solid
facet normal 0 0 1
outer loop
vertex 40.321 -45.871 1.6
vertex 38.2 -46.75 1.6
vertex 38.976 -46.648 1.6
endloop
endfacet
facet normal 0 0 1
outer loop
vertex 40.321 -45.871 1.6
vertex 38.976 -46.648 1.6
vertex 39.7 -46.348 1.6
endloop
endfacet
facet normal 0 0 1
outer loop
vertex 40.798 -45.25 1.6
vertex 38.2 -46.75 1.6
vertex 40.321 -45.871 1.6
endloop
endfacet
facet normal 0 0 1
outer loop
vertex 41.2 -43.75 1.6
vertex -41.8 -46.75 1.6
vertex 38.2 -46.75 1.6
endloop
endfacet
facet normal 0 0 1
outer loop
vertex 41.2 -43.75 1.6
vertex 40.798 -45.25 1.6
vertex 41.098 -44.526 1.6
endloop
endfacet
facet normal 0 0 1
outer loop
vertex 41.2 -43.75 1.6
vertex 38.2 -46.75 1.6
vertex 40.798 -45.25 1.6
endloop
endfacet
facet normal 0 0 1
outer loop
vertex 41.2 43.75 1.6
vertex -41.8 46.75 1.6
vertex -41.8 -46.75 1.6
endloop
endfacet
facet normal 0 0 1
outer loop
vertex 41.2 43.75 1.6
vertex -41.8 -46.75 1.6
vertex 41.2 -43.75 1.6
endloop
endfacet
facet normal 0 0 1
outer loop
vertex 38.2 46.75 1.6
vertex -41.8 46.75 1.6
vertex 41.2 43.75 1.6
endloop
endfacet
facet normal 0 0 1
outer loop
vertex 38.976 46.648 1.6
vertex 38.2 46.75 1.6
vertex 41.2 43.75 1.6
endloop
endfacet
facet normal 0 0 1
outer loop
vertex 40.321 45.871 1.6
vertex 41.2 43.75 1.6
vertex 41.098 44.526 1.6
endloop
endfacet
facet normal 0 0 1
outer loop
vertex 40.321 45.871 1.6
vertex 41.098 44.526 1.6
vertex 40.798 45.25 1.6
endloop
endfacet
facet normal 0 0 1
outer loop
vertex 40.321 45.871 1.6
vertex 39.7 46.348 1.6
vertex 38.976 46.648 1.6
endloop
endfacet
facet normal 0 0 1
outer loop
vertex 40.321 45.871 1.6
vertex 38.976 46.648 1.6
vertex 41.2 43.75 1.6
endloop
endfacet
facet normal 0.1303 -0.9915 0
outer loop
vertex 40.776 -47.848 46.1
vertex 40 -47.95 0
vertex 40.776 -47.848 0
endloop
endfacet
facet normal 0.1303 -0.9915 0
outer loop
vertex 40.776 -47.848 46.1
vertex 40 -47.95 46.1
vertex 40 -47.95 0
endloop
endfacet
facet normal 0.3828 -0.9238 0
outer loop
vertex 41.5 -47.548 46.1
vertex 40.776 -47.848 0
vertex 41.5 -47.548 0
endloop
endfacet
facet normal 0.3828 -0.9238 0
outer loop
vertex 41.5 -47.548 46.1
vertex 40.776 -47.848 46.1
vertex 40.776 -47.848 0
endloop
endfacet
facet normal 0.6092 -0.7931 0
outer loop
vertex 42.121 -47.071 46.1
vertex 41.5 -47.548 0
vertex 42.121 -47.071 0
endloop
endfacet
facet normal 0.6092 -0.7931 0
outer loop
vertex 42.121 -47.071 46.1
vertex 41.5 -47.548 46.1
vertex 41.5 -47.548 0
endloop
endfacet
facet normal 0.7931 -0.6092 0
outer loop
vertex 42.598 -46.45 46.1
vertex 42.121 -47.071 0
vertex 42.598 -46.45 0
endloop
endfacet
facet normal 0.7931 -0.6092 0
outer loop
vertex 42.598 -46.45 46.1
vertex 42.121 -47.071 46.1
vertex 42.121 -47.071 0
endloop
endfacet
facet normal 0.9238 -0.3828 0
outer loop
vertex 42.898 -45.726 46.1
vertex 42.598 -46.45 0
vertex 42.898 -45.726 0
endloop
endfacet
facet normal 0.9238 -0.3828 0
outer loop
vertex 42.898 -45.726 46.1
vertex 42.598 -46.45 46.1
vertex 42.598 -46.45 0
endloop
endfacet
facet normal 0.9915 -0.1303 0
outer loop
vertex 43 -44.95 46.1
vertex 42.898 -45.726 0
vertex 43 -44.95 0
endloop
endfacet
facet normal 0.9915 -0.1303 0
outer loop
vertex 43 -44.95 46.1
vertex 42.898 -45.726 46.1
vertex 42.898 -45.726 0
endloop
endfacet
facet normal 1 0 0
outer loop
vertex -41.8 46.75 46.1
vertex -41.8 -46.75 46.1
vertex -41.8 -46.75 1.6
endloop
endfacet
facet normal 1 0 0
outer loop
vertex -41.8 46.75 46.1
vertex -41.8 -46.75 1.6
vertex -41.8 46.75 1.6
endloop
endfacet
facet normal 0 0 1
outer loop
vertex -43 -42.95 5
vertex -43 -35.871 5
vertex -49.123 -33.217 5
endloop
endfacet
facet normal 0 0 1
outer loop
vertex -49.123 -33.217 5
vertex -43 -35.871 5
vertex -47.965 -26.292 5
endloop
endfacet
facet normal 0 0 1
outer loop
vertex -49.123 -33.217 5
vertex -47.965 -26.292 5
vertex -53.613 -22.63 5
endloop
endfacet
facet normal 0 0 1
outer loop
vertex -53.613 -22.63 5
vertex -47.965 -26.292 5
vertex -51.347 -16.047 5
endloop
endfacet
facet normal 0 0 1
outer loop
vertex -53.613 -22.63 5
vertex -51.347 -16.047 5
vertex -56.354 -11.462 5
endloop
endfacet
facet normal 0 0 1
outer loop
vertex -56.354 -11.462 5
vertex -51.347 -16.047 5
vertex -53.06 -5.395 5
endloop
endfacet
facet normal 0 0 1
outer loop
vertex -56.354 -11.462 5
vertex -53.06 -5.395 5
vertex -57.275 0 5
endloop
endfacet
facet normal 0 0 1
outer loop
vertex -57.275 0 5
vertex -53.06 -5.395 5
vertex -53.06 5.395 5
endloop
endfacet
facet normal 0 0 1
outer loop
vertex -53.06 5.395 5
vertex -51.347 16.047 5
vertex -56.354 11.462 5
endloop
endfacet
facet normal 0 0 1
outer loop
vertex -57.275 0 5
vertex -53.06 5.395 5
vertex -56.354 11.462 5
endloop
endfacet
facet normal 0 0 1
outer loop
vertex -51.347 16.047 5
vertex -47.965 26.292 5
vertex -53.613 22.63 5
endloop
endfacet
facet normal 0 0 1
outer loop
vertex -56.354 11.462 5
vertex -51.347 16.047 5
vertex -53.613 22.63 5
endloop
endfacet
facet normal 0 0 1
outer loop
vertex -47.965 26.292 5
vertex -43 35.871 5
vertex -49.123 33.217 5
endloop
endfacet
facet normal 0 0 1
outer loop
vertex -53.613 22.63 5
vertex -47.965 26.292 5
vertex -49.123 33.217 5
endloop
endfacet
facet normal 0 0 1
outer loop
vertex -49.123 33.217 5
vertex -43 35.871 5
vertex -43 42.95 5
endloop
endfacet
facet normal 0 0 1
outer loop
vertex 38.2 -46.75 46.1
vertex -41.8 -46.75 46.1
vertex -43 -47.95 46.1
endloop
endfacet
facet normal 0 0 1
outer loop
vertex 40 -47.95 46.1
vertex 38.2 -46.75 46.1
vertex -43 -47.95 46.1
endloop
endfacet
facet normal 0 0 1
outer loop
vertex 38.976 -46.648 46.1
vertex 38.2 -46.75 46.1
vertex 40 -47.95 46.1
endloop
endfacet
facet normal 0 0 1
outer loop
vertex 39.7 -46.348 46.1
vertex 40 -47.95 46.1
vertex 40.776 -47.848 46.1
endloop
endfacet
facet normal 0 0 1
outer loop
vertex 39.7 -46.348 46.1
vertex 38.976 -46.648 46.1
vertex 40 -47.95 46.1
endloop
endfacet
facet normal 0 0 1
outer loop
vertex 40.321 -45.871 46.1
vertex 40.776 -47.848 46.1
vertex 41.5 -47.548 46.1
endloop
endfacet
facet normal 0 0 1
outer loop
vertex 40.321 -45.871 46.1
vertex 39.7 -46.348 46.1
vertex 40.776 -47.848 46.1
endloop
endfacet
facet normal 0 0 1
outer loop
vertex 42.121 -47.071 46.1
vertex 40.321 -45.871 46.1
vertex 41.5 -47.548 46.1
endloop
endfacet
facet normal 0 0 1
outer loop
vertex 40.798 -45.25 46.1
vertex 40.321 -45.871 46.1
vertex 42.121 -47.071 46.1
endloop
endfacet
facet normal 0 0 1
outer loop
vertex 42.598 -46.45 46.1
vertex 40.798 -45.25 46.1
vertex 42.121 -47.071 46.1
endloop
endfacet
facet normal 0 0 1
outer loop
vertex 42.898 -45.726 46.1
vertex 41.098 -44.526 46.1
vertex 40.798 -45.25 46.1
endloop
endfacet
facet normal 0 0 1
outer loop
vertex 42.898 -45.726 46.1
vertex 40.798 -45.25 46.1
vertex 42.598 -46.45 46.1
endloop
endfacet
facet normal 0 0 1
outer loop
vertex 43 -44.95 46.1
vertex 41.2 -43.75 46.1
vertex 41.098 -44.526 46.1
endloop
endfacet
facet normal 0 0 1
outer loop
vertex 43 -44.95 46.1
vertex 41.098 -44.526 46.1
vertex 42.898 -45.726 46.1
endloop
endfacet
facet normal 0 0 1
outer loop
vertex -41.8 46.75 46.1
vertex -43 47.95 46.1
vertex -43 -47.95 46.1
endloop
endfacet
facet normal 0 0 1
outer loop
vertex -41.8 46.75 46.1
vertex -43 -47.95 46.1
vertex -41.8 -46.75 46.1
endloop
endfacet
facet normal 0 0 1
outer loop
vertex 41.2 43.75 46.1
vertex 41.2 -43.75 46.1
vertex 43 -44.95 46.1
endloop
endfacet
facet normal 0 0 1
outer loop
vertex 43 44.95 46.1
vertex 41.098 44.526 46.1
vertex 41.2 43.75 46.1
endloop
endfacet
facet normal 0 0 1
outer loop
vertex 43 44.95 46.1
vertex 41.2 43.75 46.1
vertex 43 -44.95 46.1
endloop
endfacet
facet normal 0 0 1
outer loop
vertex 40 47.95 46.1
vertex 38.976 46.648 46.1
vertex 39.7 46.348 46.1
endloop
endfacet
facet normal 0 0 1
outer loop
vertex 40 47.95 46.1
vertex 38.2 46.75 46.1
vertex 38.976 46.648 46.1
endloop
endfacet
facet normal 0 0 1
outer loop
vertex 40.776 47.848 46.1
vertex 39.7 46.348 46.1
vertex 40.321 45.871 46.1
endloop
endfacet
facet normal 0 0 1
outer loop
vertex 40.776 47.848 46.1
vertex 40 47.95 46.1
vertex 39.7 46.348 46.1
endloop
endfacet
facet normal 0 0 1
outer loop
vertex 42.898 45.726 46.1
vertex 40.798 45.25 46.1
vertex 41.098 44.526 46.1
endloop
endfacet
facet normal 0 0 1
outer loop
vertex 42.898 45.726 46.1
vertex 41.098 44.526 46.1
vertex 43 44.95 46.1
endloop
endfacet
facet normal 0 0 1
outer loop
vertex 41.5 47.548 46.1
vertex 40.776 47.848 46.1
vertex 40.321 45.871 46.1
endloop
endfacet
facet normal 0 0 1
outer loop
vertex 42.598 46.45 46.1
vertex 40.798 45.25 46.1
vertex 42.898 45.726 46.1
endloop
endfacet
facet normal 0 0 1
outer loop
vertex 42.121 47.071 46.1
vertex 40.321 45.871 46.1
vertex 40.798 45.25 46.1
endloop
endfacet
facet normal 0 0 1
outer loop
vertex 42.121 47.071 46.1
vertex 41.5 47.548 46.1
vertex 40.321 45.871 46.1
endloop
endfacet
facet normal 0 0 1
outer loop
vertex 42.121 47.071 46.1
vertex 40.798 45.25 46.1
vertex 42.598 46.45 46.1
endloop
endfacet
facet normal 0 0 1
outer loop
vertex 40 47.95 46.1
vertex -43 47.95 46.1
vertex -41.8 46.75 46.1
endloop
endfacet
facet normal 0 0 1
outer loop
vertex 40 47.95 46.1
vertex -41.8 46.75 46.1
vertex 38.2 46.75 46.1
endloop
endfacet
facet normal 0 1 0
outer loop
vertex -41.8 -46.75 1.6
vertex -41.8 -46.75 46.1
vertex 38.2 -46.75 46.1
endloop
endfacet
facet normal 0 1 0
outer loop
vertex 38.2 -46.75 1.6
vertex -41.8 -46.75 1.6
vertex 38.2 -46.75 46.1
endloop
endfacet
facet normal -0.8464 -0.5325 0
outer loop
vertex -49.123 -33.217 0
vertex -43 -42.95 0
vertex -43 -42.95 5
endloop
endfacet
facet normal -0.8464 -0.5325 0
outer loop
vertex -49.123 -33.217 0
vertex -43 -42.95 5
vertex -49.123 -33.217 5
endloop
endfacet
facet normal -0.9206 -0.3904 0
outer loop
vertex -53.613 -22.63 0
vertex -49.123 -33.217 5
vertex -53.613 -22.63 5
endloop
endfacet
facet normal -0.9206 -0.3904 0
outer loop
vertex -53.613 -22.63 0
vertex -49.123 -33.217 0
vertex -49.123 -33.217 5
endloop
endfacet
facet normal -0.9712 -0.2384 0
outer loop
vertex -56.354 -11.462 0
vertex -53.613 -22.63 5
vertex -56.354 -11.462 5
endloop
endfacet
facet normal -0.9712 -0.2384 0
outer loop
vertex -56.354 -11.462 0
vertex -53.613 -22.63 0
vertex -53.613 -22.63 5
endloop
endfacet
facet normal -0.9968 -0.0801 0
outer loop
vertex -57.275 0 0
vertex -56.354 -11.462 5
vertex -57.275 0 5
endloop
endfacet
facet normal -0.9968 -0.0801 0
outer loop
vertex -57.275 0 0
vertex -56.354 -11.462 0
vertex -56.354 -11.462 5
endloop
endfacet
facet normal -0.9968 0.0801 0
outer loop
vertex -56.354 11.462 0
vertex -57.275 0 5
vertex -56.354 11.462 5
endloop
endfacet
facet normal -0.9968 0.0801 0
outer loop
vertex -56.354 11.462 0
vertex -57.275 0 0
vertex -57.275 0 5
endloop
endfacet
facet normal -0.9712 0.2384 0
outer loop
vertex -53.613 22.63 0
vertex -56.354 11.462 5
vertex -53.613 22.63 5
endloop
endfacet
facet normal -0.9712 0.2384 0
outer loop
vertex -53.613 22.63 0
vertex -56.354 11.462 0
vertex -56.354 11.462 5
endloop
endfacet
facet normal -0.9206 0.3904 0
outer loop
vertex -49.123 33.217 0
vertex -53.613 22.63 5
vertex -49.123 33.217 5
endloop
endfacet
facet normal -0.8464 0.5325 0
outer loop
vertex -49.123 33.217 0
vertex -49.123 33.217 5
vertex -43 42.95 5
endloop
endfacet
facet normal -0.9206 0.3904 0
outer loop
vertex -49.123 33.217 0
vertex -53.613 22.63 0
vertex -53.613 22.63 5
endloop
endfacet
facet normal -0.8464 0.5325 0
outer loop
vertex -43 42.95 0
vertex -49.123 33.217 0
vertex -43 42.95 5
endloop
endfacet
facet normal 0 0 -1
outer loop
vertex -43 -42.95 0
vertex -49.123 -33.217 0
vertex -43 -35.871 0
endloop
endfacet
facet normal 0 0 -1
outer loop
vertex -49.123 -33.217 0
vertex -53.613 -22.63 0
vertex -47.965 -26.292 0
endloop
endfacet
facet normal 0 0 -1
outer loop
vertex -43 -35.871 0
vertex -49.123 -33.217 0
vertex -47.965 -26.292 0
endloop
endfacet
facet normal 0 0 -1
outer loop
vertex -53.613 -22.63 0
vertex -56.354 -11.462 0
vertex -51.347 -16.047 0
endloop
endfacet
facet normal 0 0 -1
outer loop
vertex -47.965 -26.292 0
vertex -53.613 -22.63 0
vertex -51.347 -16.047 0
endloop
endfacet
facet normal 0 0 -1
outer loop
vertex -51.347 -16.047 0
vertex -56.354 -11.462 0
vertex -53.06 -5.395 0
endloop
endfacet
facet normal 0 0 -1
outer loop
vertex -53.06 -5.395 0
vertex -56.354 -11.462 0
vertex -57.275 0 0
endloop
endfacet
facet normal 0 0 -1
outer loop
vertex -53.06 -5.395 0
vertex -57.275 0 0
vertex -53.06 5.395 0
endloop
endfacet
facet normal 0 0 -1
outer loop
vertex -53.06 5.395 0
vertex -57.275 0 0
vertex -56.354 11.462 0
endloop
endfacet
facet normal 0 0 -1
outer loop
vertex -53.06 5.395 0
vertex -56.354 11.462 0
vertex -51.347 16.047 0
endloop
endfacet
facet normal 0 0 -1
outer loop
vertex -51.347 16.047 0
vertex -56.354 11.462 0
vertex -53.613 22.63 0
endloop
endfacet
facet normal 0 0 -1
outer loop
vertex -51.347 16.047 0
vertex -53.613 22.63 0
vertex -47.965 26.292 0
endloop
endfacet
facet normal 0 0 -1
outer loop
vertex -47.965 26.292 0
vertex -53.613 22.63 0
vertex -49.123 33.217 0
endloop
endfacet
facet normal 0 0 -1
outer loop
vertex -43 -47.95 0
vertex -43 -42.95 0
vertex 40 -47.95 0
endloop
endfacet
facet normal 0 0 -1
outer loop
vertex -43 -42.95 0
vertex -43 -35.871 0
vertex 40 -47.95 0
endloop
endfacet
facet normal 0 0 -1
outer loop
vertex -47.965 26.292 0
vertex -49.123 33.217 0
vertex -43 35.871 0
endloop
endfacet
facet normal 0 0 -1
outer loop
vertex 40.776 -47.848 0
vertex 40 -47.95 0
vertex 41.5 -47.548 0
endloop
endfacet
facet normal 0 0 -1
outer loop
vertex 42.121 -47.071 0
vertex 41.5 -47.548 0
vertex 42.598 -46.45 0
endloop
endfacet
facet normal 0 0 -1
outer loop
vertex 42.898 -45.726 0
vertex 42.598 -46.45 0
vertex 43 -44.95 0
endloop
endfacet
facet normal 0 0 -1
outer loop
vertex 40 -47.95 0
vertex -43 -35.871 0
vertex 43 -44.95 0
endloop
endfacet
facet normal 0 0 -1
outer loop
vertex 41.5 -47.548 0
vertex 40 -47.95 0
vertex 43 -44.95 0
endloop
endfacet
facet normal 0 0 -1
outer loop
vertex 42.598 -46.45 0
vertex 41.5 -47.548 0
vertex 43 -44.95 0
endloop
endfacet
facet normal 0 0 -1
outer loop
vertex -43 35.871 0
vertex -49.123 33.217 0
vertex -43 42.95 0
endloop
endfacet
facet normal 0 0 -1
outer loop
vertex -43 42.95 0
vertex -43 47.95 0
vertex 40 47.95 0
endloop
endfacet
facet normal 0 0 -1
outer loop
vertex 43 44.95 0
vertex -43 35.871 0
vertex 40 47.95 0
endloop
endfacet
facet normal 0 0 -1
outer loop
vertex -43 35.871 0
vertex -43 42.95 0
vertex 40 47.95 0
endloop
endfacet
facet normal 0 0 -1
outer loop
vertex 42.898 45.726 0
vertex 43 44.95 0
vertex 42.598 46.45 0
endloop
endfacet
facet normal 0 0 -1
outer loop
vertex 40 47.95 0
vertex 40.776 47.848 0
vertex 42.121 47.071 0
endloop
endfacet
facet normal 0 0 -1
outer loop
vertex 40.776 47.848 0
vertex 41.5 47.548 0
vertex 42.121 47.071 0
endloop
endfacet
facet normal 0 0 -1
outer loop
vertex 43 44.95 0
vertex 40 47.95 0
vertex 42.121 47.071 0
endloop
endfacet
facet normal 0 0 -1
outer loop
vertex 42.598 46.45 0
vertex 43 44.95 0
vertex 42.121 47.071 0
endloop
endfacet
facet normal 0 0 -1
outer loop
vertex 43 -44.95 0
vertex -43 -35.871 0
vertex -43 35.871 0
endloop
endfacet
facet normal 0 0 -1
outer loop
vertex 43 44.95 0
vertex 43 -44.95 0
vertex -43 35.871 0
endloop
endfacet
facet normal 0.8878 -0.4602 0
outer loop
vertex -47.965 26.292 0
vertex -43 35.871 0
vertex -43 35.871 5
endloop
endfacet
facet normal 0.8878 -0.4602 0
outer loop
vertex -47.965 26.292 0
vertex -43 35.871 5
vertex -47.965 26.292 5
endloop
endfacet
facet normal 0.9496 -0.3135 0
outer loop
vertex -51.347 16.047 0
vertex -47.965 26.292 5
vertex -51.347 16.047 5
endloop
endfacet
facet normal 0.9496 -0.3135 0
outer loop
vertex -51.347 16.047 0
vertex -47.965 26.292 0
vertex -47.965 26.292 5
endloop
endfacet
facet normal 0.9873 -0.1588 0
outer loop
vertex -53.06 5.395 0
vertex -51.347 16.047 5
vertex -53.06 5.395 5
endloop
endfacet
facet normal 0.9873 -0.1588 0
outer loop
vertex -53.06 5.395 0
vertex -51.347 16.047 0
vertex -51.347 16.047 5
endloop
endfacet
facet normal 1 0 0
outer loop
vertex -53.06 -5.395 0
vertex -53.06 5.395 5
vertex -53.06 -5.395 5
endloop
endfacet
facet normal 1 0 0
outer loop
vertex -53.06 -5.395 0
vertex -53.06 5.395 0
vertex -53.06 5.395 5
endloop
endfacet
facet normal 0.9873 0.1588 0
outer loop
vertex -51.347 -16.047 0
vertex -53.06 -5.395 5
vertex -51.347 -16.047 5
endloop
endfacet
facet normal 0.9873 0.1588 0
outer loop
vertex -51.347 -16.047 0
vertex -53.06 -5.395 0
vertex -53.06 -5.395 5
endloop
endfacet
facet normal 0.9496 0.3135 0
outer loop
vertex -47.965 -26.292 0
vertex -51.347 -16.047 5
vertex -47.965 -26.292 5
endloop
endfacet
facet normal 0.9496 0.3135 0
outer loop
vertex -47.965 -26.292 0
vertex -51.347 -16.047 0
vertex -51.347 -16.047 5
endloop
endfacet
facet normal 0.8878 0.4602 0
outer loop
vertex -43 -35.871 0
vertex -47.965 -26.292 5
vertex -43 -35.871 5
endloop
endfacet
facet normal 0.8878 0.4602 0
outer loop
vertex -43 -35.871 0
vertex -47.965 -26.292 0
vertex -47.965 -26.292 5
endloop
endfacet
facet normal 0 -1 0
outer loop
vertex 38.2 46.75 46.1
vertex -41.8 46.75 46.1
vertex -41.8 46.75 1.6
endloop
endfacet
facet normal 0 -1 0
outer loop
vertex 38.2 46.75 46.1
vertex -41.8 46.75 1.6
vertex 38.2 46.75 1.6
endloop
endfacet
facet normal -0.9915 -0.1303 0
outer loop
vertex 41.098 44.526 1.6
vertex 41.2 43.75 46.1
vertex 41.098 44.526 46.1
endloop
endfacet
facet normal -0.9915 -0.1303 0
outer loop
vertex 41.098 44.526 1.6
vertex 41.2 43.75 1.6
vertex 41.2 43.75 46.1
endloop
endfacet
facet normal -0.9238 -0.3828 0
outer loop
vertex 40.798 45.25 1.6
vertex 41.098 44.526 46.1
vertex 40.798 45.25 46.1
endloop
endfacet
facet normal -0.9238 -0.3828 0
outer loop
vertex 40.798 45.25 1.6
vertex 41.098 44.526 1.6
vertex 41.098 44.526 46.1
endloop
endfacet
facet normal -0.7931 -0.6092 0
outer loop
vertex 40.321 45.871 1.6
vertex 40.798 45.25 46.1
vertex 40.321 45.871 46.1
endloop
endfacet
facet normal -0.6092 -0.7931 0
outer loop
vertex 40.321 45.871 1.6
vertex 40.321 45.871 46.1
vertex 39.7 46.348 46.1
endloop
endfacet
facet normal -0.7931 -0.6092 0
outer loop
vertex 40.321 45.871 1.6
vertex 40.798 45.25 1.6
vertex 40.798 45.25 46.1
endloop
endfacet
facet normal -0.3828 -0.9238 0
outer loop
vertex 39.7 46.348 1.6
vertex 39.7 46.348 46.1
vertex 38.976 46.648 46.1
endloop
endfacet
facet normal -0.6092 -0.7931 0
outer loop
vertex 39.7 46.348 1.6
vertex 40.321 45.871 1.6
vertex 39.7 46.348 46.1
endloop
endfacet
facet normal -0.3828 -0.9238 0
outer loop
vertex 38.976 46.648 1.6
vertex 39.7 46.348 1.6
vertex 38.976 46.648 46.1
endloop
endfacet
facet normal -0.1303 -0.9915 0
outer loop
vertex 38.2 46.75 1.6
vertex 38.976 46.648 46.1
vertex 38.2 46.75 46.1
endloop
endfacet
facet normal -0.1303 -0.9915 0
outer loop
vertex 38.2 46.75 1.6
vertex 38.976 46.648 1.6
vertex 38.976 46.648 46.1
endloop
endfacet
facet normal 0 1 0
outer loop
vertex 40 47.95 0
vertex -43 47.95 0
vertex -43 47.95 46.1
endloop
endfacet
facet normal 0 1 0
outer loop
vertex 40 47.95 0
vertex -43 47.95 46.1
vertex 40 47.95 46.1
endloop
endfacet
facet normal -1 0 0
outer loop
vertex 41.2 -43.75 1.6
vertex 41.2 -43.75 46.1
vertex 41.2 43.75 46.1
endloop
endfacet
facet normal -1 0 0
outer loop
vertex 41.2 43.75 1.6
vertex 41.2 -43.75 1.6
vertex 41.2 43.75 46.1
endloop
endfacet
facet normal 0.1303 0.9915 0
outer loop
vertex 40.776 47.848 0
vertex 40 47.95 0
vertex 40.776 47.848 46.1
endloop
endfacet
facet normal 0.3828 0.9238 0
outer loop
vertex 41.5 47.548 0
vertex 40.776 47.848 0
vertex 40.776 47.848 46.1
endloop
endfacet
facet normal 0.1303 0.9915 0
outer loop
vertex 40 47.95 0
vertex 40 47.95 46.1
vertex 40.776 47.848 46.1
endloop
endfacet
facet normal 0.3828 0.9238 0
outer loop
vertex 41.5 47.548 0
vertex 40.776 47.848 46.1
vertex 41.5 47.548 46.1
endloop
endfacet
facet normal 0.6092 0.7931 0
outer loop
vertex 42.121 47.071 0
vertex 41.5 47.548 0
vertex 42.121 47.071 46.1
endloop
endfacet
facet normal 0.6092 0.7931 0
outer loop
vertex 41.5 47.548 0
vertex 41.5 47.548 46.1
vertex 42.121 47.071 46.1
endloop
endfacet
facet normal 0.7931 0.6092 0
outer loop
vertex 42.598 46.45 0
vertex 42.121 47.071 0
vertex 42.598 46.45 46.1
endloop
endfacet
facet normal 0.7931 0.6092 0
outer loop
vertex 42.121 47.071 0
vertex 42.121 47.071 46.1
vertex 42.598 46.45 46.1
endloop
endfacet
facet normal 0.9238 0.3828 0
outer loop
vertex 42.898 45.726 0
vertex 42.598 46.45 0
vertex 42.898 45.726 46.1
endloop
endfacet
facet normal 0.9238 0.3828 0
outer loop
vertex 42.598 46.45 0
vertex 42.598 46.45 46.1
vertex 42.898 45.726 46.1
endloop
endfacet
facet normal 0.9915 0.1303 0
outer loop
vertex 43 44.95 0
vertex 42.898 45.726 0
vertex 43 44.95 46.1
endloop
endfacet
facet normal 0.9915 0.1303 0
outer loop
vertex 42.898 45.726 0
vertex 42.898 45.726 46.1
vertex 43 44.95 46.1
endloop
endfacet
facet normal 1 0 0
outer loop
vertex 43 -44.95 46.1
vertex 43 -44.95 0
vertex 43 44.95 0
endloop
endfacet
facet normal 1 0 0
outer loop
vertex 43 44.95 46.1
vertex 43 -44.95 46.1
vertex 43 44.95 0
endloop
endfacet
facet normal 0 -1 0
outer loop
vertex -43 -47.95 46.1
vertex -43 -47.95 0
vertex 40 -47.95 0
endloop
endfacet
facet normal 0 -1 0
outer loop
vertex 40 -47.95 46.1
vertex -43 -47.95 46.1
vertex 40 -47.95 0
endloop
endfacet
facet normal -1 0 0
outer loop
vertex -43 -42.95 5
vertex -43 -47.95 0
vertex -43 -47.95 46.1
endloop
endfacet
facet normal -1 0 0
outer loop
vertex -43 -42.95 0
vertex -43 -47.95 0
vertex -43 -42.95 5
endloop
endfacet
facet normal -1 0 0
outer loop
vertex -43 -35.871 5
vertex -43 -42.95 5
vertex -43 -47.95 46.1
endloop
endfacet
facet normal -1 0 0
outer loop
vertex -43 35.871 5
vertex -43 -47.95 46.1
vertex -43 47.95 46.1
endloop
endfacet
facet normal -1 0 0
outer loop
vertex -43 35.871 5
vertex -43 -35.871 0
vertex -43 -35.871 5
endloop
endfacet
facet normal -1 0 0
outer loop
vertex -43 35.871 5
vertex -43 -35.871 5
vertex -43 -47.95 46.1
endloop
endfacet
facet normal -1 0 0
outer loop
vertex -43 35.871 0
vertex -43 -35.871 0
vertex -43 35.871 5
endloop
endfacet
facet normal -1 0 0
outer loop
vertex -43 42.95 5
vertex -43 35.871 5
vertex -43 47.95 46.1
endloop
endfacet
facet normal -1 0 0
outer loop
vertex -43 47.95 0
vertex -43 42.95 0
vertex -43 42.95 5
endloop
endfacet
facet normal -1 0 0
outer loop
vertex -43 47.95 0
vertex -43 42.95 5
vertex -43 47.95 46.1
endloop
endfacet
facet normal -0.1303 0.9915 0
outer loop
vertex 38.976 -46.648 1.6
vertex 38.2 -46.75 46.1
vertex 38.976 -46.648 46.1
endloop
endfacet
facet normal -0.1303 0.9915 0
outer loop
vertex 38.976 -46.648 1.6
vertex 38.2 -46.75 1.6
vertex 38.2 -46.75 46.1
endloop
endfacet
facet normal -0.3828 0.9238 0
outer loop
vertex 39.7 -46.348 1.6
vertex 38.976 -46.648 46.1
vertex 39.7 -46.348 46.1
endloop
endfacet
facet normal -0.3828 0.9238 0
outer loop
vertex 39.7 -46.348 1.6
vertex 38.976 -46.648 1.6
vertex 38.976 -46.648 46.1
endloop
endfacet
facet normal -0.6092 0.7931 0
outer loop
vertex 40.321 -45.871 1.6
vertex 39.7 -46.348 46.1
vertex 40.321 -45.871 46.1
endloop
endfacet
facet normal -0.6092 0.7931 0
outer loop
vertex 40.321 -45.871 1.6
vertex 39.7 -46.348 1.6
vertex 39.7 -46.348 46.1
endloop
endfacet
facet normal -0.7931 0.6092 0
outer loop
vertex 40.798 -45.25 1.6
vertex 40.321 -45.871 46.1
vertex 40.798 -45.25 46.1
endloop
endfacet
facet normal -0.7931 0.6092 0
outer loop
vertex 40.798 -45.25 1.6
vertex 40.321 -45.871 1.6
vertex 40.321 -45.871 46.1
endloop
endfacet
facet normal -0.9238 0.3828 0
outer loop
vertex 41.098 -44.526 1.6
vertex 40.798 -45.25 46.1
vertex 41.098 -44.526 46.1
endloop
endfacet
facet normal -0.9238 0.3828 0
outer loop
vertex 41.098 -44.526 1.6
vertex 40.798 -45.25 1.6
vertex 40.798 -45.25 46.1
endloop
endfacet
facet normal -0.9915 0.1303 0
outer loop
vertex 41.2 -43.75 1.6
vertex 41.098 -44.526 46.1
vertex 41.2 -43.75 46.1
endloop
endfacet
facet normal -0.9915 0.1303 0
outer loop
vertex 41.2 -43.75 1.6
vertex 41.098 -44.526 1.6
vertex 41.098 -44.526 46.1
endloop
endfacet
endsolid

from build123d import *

# Parameters (mm, degrees)
SKETCH_1_W          = 86
SKETCH_1_H          = 95.9
EXTRUDE_1_DEPTH     = 46.1
EXTRUDE_2_DEPTH     = 5
SKETCH_3_W          = 83
SKETCH_3_H          = 93.5
CUT_EXTRUDE_1_DEPTH = 44.5
FILLET_1_R          = 3


with BuildPart() as part:
    # Эскиз1 → Бобышка-Вытянуть1 (new body)
    with BuildSketch(Plane.XY):
        Rectangle(SKETCH_1_W, SKETCH_1_H)
    extrude(amount=EXTRUDE_1_DEPTH)

    # Эскиз2 → Бобышка-Вытянуть2 (add)
    with BuildSketch(Plane.XY):
        with BuildLine():
            Line((-43, 42.95), (-43, 35.870635623))
            ThreePointArc((-43, 35.870635623), (-53.275135929, 0), (-43, -35.870635623))
            Line((-43, -35.870635623), (-43, -42.95))
            ThreePointArc((-43, -42.95), (-57.275135929, 0), (-43, 42.95))
        make_face()
    extrude(amount=EXTRUDE_2_DEPTH)

    # Эскиз3 → Вырез-Вытянуть1 (cut)
    with BuildSketch(Plane.XY.offset(46.1)):
        with Locations((-0.3, 0)):
            Rectangle(SKETCH_3_W, SKETCH_3_H)
    extrude(amount=-CUT_EXTRUDE_1_DEPTH, mode=Mode.SUBTRACT)

    # Скругление1
    fillet_1_edges = [part.edges().sort_by_distance(p)[0] for p in [
        (41.2, 46.75, 23.85),
        (41.2, -46.75, 23.85),
        (43, 47.95, 23.05),
        (43, -47.95, 23.05),
    ]]
    fillet(fillet_1_edges, radius=FILLET_1_R)


solid = part.part
